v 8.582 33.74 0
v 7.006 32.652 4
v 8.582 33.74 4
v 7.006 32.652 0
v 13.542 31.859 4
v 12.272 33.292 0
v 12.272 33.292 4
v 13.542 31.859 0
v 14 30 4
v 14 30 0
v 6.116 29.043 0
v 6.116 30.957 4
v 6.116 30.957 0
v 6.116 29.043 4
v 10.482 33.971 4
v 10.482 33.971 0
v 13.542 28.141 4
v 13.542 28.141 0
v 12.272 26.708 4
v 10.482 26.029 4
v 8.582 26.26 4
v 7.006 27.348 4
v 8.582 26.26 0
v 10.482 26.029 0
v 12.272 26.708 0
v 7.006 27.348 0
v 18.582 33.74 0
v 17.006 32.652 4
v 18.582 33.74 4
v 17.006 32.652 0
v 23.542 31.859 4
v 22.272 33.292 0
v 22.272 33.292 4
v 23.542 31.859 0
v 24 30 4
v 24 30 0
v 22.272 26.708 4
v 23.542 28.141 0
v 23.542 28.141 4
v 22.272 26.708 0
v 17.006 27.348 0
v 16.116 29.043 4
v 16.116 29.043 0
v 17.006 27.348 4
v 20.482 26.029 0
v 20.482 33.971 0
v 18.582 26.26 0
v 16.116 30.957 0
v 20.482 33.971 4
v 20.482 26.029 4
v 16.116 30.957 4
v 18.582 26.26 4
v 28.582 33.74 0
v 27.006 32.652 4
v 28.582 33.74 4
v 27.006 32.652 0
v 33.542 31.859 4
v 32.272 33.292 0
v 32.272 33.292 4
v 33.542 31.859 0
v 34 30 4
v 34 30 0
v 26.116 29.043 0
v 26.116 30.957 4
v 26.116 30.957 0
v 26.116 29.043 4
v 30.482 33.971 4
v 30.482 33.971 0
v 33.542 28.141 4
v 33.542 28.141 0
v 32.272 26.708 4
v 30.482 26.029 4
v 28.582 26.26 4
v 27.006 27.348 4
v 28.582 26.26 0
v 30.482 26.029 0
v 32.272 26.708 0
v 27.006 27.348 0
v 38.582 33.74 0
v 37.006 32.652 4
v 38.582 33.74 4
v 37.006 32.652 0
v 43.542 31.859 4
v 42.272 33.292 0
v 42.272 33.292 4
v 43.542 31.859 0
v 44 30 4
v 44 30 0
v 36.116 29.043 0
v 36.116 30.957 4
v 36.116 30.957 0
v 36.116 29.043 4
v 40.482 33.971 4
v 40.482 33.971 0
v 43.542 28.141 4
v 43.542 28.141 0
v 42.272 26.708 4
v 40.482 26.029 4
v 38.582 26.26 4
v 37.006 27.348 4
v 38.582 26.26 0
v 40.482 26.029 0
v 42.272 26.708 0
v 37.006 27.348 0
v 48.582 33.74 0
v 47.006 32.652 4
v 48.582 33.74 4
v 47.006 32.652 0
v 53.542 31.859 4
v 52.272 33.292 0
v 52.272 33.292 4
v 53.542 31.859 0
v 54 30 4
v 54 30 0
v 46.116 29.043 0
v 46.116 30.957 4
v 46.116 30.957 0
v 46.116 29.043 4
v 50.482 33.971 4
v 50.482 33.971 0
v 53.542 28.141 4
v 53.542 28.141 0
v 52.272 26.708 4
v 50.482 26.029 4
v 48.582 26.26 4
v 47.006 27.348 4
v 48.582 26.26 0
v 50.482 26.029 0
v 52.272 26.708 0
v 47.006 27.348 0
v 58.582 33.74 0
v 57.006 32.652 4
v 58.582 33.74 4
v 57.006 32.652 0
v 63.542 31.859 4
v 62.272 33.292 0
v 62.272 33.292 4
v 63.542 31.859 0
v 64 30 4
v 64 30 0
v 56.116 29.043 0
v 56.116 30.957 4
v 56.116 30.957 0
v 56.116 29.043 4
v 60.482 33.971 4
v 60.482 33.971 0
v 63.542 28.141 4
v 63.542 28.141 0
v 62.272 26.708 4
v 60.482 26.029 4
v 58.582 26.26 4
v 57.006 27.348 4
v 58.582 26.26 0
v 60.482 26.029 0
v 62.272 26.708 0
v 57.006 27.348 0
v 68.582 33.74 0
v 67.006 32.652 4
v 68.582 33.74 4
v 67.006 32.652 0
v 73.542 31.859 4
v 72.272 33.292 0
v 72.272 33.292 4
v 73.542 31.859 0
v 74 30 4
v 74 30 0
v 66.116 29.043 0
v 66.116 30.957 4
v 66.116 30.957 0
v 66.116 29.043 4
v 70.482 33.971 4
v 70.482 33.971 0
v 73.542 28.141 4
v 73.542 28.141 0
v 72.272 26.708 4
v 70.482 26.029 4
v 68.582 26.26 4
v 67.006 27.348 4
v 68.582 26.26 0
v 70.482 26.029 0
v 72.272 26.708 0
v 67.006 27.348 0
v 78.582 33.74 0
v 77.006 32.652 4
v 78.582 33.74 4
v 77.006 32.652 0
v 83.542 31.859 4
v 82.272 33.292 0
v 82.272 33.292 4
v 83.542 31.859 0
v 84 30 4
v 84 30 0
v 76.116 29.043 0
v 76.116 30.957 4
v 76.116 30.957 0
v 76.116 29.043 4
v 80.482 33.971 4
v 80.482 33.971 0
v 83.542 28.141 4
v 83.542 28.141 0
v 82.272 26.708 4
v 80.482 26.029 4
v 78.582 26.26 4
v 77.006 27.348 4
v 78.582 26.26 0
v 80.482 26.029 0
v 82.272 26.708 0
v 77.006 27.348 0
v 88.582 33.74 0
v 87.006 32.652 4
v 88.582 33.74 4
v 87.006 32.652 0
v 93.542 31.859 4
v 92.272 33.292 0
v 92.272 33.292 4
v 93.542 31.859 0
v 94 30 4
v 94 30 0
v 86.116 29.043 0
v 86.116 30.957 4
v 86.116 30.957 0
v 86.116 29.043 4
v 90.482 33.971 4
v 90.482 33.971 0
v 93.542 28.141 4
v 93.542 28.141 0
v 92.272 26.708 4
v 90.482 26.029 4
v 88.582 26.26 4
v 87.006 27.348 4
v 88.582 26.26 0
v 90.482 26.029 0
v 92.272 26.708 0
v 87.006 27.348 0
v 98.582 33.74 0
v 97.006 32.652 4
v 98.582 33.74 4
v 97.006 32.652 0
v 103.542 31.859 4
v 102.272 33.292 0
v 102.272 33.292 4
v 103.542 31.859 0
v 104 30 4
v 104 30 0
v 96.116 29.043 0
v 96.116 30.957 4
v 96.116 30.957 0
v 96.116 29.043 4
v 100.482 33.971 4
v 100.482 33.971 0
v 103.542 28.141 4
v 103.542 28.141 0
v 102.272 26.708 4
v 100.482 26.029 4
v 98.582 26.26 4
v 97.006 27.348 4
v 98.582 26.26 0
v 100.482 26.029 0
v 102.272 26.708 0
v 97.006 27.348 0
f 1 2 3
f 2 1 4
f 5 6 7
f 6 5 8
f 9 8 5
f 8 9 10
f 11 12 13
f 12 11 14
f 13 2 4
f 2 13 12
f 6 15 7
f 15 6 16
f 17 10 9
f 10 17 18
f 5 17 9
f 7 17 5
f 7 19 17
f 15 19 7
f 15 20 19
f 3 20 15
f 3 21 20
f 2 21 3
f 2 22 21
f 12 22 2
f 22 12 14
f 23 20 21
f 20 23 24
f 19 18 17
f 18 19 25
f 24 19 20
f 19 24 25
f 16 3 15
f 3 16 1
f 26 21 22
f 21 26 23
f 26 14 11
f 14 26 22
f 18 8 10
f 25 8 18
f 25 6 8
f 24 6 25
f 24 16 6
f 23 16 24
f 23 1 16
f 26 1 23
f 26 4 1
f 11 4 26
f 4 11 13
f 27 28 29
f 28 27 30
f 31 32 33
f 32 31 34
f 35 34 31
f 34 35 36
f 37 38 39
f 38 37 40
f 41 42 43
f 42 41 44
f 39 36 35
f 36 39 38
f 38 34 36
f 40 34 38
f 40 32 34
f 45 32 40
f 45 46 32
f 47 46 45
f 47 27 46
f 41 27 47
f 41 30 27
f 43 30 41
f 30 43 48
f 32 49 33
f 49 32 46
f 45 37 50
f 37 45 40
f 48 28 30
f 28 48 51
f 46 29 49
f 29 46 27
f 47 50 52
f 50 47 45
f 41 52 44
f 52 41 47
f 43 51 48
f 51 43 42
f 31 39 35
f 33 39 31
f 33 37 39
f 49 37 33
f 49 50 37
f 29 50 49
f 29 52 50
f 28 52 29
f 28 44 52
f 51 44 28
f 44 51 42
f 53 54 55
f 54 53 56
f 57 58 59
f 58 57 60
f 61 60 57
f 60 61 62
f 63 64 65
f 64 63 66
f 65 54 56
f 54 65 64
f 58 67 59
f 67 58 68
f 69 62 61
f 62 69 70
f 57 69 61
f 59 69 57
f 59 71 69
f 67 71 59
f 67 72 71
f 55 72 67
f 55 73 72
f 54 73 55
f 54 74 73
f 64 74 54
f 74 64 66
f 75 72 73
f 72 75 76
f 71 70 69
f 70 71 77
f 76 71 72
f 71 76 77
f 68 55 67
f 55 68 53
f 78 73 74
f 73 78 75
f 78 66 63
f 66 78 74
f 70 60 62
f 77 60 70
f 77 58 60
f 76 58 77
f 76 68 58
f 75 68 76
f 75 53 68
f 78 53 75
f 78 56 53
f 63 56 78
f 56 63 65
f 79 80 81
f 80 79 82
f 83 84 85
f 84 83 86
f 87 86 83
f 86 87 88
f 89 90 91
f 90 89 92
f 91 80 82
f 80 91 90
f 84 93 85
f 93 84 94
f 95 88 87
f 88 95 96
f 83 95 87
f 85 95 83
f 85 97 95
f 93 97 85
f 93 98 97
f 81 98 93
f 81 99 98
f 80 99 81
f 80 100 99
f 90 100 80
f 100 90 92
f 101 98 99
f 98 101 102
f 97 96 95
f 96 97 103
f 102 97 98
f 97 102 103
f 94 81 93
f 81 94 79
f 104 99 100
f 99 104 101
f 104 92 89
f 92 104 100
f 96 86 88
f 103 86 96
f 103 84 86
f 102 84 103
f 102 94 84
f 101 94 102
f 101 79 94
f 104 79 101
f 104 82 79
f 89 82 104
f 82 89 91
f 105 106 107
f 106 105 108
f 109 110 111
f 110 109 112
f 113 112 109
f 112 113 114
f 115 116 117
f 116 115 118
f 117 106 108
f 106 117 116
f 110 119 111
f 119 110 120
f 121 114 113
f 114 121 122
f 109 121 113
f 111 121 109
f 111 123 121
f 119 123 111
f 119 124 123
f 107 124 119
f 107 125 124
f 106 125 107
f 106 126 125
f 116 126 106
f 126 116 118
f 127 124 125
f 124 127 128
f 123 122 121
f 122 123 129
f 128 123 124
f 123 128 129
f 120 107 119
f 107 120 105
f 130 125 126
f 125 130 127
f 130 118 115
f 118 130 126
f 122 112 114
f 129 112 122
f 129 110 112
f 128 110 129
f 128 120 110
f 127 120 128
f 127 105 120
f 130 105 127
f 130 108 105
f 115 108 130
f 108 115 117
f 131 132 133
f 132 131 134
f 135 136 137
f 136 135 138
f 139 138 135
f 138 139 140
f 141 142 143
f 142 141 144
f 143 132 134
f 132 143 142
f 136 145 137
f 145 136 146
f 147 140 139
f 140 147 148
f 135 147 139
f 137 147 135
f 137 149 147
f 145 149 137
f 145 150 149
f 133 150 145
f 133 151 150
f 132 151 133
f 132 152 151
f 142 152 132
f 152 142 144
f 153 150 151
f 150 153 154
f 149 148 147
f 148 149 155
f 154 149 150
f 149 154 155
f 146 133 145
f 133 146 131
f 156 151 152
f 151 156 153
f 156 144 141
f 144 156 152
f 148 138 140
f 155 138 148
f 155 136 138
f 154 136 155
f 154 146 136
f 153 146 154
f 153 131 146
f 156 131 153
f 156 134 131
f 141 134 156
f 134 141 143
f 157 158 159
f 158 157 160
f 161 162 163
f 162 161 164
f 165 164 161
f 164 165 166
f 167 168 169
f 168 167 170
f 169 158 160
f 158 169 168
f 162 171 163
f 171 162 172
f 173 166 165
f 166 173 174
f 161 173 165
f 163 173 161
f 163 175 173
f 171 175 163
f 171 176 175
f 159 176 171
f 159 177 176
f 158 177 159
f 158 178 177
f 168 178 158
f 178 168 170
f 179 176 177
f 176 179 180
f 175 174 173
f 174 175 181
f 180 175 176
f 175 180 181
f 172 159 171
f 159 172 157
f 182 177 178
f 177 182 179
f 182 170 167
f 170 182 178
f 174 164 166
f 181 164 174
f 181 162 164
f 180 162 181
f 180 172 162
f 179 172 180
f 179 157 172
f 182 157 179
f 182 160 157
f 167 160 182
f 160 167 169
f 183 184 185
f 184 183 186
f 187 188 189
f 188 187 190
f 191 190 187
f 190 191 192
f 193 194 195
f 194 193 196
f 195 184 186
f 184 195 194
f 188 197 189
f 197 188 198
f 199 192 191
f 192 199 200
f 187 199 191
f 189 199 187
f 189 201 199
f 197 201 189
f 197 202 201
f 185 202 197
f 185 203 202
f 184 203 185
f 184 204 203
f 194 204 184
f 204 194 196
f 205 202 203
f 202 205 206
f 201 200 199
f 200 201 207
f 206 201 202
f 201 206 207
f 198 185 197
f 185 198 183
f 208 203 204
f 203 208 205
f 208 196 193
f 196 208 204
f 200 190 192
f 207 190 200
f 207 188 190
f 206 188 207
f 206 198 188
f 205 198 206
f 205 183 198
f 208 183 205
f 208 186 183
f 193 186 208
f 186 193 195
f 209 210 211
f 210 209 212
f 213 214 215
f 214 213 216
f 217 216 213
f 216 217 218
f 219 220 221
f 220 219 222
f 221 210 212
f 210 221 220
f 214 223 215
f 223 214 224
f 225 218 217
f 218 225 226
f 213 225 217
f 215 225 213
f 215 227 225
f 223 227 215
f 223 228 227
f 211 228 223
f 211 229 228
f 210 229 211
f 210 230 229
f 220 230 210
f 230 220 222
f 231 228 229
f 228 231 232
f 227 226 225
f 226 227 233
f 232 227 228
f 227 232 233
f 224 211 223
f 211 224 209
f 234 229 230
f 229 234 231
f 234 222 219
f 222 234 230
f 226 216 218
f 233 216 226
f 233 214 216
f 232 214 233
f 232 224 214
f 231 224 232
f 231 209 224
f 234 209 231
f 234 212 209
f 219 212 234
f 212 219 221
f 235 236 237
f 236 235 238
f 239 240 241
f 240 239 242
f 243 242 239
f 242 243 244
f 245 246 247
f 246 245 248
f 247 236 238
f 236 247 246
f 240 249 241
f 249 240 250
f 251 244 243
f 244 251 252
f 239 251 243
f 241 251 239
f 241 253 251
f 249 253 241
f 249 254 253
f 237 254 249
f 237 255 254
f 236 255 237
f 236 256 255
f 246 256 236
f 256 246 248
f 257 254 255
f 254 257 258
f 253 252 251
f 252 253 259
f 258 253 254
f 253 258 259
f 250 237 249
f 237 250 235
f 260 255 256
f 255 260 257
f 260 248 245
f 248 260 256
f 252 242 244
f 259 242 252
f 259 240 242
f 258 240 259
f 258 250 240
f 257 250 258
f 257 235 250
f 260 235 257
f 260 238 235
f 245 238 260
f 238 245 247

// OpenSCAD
translate([10, 30, 0]) cylinder(h=4, r1=4, r2=4);
translate([20, 30, 0]) cylinder(h=4, r1=4, r2=4);
translate([30, 30, 0]) cylinder(h=4, r1=4, r2=4);
translate([40, 30, 0]) cylinder(h=4, r1=4, r2=4);
translate([50, 30, 0]) cylinder(h=4, r1=4, r2=4);
translate([60, 30, 0]) cylinder(h=4, r1=4, r2=4);
translate([70, 30, 0]) cylinder(h=4, r1=4, r2=4);
translate([80, 30, 0]) cylinder(h=4, r1=4, r2=4);
translate([90, 30, 0]) cylinder(h=4, r1=4, r2=4);
translate([100, 30, 0]) cylinder(h=4, r1=4, r2=4);
